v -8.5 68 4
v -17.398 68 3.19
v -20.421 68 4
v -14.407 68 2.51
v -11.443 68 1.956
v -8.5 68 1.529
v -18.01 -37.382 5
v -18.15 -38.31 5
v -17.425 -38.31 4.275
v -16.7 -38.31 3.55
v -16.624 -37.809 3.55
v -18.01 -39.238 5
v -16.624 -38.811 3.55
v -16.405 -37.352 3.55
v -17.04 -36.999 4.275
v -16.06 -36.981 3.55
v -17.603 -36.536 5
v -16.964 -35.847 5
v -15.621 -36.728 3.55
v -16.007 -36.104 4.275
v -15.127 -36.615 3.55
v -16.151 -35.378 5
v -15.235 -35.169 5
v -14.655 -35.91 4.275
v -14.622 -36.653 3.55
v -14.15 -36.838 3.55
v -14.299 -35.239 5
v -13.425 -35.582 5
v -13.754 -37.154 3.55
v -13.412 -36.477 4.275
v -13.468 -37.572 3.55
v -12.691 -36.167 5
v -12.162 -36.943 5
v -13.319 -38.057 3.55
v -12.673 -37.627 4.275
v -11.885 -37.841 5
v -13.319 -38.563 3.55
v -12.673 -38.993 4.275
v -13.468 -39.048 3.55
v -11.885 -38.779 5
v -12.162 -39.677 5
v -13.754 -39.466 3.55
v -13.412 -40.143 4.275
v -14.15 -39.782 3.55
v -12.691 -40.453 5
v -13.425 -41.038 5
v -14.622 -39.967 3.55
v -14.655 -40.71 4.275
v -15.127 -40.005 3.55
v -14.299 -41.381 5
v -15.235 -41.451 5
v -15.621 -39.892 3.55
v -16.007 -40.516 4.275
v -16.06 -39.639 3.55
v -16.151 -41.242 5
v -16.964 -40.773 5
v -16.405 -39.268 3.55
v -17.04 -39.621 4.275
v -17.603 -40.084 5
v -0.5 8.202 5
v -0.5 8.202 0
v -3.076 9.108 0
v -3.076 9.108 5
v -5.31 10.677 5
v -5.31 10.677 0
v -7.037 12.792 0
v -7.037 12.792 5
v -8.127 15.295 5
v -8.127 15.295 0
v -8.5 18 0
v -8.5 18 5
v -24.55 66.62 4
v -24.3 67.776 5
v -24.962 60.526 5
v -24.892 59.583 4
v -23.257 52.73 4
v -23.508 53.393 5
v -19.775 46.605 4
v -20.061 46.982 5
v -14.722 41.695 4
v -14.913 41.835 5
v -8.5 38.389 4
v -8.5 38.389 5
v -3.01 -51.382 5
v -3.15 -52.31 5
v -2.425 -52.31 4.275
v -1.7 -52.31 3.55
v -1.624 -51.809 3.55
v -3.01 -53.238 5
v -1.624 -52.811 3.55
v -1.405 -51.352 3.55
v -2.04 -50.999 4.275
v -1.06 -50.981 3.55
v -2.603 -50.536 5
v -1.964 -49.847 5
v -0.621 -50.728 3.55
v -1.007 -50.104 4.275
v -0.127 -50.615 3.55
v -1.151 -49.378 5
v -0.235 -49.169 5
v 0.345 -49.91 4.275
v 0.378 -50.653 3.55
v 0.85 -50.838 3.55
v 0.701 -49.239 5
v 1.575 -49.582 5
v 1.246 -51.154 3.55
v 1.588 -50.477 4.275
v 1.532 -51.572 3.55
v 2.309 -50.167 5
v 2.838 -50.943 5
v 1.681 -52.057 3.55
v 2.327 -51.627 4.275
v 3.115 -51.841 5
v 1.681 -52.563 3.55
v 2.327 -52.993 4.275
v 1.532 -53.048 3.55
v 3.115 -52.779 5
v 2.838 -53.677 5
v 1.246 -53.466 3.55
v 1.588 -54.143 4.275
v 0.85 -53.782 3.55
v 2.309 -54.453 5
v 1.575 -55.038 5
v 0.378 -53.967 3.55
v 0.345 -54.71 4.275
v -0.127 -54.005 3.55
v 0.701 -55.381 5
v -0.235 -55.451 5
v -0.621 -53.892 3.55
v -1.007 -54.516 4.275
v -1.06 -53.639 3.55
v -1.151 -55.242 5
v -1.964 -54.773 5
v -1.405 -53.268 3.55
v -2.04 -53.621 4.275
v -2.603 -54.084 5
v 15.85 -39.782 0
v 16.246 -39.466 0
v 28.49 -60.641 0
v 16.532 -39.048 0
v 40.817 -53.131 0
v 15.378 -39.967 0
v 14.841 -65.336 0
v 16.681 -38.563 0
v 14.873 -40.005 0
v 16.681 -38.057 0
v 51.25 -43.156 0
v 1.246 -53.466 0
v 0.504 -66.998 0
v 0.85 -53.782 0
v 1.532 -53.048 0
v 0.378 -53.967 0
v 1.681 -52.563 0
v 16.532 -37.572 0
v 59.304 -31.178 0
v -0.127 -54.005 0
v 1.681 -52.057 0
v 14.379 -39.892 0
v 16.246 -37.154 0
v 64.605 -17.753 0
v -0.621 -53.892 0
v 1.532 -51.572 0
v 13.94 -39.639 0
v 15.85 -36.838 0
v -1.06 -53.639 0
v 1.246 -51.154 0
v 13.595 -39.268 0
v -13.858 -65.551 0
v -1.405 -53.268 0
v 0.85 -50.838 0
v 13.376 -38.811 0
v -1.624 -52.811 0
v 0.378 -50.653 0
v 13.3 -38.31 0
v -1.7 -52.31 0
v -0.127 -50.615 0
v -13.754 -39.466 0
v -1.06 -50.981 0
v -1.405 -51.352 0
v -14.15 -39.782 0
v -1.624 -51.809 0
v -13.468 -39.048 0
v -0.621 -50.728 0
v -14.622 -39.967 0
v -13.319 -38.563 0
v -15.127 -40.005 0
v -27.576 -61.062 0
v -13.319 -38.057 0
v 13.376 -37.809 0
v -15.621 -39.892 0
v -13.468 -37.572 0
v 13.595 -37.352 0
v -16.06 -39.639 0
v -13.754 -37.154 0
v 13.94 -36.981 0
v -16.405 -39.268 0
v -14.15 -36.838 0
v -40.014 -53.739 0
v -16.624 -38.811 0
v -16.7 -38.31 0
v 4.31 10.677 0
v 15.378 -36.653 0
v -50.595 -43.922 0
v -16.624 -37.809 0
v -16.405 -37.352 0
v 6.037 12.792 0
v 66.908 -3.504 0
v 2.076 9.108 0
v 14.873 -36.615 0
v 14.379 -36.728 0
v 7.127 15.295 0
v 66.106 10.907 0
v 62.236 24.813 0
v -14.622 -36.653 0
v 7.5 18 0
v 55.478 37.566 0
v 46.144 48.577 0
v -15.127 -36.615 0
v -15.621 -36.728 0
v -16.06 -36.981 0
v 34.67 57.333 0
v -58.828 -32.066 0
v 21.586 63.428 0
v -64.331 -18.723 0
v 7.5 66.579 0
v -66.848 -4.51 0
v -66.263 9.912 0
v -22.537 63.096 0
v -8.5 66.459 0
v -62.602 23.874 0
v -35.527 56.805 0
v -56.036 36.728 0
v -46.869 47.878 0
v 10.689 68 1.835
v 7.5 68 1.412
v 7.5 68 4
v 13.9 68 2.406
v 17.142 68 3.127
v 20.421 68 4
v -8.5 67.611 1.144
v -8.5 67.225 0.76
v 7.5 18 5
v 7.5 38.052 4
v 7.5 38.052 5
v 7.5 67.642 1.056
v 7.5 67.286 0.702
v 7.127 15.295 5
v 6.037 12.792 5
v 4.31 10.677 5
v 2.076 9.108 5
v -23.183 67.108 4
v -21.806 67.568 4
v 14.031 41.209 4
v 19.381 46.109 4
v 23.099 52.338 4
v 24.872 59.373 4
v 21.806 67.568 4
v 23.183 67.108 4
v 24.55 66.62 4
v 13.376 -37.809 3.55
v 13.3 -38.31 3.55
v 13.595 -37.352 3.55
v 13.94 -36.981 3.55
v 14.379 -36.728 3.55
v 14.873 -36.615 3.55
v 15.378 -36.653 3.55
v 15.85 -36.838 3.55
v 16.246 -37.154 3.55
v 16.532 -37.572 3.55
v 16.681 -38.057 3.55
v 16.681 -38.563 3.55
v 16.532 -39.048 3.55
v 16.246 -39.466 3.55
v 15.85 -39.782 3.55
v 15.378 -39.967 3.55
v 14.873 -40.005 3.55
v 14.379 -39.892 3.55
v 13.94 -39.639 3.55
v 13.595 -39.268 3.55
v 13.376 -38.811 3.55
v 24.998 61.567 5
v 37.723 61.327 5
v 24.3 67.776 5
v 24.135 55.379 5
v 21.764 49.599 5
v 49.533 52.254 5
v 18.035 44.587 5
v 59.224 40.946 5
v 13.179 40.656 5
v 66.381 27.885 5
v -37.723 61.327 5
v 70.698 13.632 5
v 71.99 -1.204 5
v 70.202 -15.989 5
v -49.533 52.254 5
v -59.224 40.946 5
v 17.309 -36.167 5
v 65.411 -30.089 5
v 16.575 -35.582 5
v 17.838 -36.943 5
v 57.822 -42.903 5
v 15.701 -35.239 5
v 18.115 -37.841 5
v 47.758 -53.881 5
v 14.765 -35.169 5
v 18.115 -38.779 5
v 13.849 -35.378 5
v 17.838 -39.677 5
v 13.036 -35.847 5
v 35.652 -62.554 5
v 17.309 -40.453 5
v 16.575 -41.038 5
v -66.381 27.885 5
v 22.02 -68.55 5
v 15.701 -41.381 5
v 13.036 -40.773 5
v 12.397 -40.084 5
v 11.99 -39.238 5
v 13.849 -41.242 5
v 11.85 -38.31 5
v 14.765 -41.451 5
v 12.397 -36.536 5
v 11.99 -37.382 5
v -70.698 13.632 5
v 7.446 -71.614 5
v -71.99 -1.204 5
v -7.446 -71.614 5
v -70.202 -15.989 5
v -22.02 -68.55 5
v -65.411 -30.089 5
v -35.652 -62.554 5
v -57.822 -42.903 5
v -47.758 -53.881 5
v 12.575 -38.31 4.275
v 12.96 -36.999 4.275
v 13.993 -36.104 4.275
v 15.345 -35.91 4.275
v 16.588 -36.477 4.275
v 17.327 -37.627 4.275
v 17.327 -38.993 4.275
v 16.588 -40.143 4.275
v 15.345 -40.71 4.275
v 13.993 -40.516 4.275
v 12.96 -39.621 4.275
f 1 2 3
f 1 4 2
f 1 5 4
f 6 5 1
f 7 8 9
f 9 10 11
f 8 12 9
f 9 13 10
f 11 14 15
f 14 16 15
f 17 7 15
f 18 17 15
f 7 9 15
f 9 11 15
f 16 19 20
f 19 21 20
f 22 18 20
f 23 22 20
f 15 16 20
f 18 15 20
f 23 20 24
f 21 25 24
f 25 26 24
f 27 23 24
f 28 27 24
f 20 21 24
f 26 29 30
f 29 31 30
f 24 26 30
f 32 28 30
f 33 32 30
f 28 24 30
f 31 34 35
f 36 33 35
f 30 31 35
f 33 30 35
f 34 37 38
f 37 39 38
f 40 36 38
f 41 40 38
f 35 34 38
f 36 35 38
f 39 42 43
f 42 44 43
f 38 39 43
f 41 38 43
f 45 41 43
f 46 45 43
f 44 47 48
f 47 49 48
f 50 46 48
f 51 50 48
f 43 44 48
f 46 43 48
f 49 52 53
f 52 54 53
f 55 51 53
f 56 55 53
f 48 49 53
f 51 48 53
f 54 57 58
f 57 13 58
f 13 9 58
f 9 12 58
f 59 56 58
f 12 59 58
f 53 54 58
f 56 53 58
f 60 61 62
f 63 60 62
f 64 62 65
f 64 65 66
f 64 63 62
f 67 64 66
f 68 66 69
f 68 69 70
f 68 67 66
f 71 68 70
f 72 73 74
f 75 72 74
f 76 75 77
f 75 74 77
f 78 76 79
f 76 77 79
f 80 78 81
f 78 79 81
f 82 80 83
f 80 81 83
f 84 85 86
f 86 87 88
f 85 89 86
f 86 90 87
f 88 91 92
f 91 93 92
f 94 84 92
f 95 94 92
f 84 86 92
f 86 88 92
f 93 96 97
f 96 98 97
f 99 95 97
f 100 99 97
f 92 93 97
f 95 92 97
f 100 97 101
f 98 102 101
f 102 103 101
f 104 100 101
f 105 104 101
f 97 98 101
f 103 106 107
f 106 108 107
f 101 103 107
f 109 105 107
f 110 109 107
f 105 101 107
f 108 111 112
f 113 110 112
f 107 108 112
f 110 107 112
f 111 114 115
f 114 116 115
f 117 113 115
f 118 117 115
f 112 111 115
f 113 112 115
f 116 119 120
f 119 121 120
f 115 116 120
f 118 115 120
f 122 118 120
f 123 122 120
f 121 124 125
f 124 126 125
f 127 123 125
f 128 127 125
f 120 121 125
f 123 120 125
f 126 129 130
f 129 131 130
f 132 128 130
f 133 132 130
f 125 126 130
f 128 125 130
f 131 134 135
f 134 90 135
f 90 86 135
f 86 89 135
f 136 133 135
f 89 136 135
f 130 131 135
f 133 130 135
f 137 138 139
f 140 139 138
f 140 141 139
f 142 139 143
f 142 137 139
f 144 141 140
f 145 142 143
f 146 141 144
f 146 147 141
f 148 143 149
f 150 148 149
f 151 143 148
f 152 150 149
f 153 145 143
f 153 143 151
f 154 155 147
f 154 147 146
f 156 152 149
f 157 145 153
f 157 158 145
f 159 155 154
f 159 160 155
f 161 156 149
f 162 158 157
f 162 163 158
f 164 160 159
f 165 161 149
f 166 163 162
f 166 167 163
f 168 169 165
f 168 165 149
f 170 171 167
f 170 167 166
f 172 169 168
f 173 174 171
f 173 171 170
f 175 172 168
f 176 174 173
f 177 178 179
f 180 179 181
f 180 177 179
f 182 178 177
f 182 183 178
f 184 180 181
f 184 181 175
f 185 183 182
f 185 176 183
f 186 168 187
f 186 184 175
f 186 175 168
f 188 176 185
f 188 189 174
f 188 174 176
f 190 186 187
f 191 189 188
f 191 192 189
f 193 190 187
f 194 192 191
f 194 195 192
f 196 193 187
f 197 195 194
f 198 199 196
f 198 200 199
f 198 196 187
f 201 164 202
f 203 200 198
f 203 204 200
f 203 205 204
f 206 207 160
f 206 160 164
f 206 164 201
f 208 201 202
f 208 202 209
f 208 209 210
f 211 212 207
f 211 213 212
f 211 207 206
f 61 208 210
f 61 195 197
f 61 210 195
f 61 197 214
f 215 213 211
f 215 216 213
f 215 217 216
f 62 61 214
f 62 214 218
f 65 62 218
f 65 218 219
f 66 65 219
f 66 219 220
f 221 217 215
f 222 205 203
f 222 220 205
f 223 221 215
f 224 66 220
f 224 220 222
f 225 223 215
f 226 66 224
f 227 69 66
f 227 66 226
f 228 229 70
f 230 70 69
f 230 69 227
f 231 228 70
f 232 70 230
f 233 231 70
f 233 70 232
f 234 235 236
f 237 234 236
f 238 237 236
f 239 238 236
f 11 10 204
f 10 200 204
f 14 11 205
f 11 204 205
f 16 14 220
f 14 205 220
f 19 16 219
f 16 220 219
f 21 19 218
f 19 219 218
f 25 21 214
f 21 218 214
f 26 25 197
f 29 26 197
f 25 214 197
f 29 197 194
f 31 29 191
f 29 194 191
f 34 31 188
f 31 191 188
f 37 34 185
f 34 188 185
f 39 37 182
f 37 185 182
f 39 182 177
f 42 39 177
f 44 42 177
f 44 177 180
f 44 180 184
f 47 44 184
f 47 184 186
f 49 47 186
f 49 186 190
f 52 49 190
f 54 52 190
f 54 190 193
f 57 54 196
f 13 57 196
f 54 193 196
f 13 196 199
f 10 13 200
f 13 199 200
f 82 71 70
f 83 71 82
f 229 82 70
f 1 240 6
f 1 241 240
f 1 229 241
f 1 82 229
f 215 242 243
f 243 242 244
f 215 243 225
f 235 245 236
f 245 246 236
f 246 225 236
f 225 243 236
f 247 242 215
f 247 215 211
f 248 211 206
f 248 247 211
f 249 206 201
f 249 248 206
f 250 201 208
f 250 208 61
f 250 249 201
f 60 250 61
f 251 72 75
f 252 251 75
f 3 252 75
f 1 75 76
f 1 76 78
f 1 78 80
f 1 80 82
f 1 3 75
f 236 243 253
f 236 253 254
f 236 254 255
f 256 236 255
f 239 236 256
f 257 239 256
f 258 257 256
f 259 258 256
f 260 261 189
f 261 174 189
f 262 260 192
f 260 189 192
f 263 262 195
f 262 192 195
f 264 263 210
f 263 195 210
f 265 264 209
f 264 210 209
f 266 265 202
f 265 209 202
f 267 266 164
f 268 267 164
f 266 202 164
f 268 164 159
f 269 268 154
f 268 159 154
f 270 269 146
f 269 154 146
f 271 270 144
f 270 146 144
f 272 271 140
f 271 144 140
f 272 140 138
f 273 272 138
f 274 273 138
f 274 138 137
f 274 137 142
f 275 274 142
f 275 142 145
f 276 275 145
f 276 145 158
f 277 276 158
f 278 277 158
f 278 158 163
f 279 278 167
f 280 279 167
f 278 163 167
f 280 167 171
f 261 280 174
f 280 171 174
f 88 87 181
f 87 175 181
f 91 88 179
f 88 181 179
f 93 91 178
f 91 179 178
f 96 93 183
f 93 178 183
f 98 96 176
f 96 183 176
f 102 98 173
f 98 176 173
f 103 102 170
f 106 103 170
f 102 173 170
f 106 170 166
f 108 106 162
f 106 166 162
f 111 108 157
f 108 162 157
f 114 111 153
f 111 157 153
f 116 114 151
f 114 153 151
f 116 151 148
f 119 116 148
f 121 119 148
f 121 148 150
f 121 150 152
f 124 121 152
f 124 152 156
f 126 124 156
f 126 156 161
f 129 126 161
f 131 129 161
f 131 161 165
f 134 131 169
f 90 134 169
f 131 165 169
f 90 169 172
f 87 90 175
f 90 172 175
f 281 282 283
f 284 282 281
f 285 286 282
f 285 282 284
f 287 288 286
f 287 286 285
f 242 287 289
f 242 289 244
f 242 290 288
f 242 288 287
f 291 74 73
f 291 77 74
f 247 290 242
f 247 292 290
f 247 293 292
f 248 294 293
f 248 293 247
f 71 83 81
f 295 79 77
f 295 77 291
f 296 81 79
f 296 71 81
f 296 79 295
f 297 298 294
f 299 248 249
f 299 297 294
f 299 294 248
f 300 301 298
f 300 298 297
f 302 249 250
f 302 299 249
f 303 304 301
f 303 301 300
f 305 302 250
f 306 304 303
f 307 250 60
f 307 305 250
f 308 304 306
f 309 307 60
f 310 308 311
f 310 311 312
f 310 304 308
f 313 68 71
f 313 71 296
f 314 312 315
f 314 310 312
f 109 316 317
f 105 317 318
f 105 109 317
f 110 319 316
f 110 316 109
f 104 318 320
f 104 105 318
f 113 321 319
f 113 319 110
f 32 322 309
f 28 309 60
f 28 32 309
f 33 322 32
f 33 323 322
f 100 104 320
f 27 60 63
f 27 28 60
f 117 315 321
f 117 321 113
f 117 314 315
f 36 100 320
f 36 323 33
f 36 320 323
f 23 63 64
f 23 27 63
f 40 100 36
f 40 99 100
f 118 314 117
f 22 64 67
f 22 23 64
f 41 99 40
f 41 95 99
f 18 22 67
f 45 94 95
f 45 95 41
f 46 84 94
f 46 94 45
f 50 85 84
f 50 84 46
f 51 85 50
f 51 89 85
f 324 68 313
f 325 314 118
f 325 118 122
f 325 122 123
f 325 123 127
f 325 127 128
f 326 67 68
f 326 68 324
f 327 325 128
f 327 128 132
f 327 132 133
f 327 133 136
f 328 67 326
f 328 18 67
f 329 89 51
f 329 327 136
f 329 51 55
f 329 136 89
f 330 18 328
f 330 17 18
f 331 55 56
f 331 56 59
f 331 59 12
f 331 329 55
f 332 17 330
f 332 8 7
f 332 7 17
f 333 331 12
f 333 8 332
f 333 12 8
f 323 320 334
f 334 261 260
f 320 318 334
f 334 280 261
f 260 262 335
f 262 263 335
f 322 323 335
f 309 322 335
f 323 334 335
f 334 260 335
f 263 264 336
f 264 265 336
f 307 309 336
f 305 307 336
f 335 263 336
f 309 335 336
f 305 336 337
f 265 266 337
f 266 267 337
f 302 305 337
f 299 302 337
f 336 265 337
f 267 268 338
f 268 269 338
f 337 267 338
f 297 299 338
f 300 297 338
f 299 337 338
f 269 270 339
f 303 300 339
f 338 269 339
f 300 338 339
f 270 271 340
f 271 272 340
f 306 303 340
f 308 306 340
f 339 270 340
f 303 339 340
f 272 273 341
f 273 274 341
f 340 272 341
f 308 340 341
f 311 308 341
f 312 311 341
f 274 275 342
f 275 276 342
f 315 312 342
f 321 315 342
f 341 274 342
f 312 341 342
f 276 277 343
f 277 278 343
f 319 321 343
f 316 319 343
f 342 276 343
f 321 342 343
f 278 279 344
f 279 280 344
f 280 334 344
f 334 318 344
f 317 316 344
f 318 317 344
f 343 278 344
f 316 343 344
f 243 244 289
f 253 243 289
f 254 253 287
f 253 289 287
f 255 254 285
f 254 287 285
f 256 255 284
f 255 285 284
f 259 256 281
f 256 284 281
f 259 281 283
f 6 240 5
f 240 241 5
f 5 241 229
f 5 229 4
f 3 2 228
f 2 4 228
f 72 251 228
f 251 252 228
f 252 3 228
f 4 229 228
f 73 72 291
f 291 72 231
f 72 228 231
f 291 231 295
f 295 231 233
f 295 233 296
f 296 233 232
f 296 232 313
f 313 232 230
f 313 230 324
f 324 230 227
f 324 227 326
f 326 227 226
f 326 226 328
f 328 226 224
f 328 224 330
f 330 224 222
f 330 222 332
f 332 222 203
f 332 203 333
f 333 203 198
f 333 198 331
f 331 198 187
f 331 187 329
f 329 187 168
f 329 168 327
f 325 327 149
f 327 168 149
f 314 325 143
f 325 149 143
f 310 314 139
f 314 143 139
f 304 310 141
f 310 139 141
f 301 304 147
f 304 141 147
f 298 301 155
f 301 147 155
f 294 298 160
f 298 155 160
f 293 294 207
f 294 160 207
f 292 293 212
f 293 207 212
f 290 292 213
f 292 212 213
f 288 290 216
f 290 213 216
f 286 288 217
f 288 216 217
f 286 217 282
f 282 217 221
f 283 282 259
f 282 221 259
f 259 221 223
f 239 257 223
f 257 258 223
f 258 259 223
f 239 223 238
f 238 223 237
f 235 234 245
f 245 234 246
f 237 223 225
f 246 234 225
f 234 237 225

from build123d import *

# Parameters (mm, degrees)
BOSS_EXTRUDE2_DEPTH                                 = 5
CSK_FOR_M3_COUNTERSUNK_FLAT_HEAD_SCREW1_D           = 3.4
CSK_FOR_M3_COUNTERSUNK_FLAT_HEAD_SCREW1_DEPTH       = 5
CSK_FOR_M3_COUNTERSUNK_FLAT_HEAD_SCREW1_CSINK_D     = 6.3
CSK_FOR_M3_COUNTERSUNK_FLAT_HEAD_SCREW1_CSINK_ANGLE = 90
CSK_FOR_M3_COUNTERSUNK_FLAT_HEAD_SCREW1_TIP         = 1.021463052
CUT_EXTRUDE1_REACH                                  = 103.946
SKETCH4_W                                           = 16
SKETCH4_H                                           = 60
SKETCH5_R                                           = 25
CUT_EXTRUDE2_DEPTH                                  = 1
FILLET1_R                                           = 10


with BuildPart() as part:
    # Sketch1 → Boss-Extrude2 (new body)
    with BuildSketch(Plane.XY):
        with BuildLine():
            Line((-23.664319132, 68), (23.664319132, 68))
            ThreePointArc((23.664319132, 68), (0, -72), (-23.664319132, 68))
        make_face()
    extrude(amount=BOSS_EXTRUDE2_DEPTH)

    # Chamfer1: read off the stored shape, not the designer's step
    # Chamfer1 outline → Chamfer1 (revolve, cut)
    with BuildSketch(Plane.XZ):
        Polygon((72.000000172, 5.000000172), (67, 0), (72.000000172, 0), align=None)
    revolve(axis=Axis((0, 0, 0), (0, 0, 1)), mode=Mode.SUBTRACT)

    # CSK for M3 Countersunk Flat Head Screw1
    with Locations(Plane.XY.offset(5)):
        with Locations((15, -38.31), (-15, -38.31), (0, -52.31)):
            CounterSinkHole(CSK_FOR_M3_COUNTERSUNK_FLAT_HEAD_SCREW1_D / 2, CSK_FOR_M3_COUNTERSUNK_FLAT_HEAD_SCREW1_CSINK_D / 2, depth=CSK_FOR_M3_COUNTERSUNK_FLAT_HEAD_SCREW1_DEPTH, counter_sink_angle=CSK_FOR_M3_COUNTERSUNK_FLAT_HEAD_SCREW1_CSINK_ANGLE)
            with Locations((0, 0, -(CSK_FOR_M3_COUNTERSUNK_FLAT_HEAD_SCREW1_DEPTH + CSK_FOR_M3_COUNTERSUNK_FLAT_HEAD_SCREW1_TIP / 2))):  # 118° drill point
                Cone(0, CSK_FOR_M3_COUNTERSUNK_FLAT_HEAD_SCREW1_D / 2, CSK_FOR_M3_COUNTERSUNK_FLAT_HEAD_SCREW1_TIP, mode=Mode.SUBTRACT)

    # Cut-Extrude1: up to this face of the body (flat: up to its plane)
    cut_extrude1_end = Plane(part.part.faces().sort_by_distance((0, 0.083165236, 0))[0])
    # Sketch4 → Cut-Extrude1 (cut, up to the picked face)
    with BuildSketch(Plane.XY.offset(5), mode=Mode.PRIVATE) as cut_extrude1_sk1:
        with Locations((-0.5, 38)):
            Rectangle(SKETCH4_W, SKETCH4_H)
    cut_extrude1_tool1 = split(extrude(cut_extrude1_sk1.sketch, amount=-CUT_EXTRUDE1_REACH, mode=Mode.PRIVATE), bisect_by=cut_extrude1_end, keep=Keep.BOTH, mode=Mode.PRIVATE)
    add(cut_extrude1_tool1.solids().sort_by(Axis((-0.5, 38, 5), (0, 0, -1)))[0], mode=Mode.SUBTRACT)

    # Sketch5 → Cut-Extrude2 (cut)
    with BuildSketch(Plane.XY.offset(5)):
        with Locations((0, 61.9)):
            Circle(SKETCH5_R)
    extrude(amount=-CUT_EXTRUDE2_DEPTH, mode=Mode.SUBTRACT)

    # Fillet1
    # the kernel refuses this fillet: 10 mm, written as the material it adds along each edge
    with BuildSketch(Plane(origin=(-8.5, 8, 5), x_dir=(1, 0, 0), z_dir=(0, 0, -1)), Plane(origin=(7.5, 8, 5), x_dir=(0, 1, 0), z_dir=(0, 0, -1))) as fillet1_piece_1:
        with BuildLine():
            CenterArc((FILLET1_R, -FILLET1_R), FILLET1_R, 90, 90)
            Line((0, -FILLET1_R), (0, 0))
            Line((0, 0), (FILLET1_R, 0))
        make_face()
    extrude(amount=5)


solid = part.part
